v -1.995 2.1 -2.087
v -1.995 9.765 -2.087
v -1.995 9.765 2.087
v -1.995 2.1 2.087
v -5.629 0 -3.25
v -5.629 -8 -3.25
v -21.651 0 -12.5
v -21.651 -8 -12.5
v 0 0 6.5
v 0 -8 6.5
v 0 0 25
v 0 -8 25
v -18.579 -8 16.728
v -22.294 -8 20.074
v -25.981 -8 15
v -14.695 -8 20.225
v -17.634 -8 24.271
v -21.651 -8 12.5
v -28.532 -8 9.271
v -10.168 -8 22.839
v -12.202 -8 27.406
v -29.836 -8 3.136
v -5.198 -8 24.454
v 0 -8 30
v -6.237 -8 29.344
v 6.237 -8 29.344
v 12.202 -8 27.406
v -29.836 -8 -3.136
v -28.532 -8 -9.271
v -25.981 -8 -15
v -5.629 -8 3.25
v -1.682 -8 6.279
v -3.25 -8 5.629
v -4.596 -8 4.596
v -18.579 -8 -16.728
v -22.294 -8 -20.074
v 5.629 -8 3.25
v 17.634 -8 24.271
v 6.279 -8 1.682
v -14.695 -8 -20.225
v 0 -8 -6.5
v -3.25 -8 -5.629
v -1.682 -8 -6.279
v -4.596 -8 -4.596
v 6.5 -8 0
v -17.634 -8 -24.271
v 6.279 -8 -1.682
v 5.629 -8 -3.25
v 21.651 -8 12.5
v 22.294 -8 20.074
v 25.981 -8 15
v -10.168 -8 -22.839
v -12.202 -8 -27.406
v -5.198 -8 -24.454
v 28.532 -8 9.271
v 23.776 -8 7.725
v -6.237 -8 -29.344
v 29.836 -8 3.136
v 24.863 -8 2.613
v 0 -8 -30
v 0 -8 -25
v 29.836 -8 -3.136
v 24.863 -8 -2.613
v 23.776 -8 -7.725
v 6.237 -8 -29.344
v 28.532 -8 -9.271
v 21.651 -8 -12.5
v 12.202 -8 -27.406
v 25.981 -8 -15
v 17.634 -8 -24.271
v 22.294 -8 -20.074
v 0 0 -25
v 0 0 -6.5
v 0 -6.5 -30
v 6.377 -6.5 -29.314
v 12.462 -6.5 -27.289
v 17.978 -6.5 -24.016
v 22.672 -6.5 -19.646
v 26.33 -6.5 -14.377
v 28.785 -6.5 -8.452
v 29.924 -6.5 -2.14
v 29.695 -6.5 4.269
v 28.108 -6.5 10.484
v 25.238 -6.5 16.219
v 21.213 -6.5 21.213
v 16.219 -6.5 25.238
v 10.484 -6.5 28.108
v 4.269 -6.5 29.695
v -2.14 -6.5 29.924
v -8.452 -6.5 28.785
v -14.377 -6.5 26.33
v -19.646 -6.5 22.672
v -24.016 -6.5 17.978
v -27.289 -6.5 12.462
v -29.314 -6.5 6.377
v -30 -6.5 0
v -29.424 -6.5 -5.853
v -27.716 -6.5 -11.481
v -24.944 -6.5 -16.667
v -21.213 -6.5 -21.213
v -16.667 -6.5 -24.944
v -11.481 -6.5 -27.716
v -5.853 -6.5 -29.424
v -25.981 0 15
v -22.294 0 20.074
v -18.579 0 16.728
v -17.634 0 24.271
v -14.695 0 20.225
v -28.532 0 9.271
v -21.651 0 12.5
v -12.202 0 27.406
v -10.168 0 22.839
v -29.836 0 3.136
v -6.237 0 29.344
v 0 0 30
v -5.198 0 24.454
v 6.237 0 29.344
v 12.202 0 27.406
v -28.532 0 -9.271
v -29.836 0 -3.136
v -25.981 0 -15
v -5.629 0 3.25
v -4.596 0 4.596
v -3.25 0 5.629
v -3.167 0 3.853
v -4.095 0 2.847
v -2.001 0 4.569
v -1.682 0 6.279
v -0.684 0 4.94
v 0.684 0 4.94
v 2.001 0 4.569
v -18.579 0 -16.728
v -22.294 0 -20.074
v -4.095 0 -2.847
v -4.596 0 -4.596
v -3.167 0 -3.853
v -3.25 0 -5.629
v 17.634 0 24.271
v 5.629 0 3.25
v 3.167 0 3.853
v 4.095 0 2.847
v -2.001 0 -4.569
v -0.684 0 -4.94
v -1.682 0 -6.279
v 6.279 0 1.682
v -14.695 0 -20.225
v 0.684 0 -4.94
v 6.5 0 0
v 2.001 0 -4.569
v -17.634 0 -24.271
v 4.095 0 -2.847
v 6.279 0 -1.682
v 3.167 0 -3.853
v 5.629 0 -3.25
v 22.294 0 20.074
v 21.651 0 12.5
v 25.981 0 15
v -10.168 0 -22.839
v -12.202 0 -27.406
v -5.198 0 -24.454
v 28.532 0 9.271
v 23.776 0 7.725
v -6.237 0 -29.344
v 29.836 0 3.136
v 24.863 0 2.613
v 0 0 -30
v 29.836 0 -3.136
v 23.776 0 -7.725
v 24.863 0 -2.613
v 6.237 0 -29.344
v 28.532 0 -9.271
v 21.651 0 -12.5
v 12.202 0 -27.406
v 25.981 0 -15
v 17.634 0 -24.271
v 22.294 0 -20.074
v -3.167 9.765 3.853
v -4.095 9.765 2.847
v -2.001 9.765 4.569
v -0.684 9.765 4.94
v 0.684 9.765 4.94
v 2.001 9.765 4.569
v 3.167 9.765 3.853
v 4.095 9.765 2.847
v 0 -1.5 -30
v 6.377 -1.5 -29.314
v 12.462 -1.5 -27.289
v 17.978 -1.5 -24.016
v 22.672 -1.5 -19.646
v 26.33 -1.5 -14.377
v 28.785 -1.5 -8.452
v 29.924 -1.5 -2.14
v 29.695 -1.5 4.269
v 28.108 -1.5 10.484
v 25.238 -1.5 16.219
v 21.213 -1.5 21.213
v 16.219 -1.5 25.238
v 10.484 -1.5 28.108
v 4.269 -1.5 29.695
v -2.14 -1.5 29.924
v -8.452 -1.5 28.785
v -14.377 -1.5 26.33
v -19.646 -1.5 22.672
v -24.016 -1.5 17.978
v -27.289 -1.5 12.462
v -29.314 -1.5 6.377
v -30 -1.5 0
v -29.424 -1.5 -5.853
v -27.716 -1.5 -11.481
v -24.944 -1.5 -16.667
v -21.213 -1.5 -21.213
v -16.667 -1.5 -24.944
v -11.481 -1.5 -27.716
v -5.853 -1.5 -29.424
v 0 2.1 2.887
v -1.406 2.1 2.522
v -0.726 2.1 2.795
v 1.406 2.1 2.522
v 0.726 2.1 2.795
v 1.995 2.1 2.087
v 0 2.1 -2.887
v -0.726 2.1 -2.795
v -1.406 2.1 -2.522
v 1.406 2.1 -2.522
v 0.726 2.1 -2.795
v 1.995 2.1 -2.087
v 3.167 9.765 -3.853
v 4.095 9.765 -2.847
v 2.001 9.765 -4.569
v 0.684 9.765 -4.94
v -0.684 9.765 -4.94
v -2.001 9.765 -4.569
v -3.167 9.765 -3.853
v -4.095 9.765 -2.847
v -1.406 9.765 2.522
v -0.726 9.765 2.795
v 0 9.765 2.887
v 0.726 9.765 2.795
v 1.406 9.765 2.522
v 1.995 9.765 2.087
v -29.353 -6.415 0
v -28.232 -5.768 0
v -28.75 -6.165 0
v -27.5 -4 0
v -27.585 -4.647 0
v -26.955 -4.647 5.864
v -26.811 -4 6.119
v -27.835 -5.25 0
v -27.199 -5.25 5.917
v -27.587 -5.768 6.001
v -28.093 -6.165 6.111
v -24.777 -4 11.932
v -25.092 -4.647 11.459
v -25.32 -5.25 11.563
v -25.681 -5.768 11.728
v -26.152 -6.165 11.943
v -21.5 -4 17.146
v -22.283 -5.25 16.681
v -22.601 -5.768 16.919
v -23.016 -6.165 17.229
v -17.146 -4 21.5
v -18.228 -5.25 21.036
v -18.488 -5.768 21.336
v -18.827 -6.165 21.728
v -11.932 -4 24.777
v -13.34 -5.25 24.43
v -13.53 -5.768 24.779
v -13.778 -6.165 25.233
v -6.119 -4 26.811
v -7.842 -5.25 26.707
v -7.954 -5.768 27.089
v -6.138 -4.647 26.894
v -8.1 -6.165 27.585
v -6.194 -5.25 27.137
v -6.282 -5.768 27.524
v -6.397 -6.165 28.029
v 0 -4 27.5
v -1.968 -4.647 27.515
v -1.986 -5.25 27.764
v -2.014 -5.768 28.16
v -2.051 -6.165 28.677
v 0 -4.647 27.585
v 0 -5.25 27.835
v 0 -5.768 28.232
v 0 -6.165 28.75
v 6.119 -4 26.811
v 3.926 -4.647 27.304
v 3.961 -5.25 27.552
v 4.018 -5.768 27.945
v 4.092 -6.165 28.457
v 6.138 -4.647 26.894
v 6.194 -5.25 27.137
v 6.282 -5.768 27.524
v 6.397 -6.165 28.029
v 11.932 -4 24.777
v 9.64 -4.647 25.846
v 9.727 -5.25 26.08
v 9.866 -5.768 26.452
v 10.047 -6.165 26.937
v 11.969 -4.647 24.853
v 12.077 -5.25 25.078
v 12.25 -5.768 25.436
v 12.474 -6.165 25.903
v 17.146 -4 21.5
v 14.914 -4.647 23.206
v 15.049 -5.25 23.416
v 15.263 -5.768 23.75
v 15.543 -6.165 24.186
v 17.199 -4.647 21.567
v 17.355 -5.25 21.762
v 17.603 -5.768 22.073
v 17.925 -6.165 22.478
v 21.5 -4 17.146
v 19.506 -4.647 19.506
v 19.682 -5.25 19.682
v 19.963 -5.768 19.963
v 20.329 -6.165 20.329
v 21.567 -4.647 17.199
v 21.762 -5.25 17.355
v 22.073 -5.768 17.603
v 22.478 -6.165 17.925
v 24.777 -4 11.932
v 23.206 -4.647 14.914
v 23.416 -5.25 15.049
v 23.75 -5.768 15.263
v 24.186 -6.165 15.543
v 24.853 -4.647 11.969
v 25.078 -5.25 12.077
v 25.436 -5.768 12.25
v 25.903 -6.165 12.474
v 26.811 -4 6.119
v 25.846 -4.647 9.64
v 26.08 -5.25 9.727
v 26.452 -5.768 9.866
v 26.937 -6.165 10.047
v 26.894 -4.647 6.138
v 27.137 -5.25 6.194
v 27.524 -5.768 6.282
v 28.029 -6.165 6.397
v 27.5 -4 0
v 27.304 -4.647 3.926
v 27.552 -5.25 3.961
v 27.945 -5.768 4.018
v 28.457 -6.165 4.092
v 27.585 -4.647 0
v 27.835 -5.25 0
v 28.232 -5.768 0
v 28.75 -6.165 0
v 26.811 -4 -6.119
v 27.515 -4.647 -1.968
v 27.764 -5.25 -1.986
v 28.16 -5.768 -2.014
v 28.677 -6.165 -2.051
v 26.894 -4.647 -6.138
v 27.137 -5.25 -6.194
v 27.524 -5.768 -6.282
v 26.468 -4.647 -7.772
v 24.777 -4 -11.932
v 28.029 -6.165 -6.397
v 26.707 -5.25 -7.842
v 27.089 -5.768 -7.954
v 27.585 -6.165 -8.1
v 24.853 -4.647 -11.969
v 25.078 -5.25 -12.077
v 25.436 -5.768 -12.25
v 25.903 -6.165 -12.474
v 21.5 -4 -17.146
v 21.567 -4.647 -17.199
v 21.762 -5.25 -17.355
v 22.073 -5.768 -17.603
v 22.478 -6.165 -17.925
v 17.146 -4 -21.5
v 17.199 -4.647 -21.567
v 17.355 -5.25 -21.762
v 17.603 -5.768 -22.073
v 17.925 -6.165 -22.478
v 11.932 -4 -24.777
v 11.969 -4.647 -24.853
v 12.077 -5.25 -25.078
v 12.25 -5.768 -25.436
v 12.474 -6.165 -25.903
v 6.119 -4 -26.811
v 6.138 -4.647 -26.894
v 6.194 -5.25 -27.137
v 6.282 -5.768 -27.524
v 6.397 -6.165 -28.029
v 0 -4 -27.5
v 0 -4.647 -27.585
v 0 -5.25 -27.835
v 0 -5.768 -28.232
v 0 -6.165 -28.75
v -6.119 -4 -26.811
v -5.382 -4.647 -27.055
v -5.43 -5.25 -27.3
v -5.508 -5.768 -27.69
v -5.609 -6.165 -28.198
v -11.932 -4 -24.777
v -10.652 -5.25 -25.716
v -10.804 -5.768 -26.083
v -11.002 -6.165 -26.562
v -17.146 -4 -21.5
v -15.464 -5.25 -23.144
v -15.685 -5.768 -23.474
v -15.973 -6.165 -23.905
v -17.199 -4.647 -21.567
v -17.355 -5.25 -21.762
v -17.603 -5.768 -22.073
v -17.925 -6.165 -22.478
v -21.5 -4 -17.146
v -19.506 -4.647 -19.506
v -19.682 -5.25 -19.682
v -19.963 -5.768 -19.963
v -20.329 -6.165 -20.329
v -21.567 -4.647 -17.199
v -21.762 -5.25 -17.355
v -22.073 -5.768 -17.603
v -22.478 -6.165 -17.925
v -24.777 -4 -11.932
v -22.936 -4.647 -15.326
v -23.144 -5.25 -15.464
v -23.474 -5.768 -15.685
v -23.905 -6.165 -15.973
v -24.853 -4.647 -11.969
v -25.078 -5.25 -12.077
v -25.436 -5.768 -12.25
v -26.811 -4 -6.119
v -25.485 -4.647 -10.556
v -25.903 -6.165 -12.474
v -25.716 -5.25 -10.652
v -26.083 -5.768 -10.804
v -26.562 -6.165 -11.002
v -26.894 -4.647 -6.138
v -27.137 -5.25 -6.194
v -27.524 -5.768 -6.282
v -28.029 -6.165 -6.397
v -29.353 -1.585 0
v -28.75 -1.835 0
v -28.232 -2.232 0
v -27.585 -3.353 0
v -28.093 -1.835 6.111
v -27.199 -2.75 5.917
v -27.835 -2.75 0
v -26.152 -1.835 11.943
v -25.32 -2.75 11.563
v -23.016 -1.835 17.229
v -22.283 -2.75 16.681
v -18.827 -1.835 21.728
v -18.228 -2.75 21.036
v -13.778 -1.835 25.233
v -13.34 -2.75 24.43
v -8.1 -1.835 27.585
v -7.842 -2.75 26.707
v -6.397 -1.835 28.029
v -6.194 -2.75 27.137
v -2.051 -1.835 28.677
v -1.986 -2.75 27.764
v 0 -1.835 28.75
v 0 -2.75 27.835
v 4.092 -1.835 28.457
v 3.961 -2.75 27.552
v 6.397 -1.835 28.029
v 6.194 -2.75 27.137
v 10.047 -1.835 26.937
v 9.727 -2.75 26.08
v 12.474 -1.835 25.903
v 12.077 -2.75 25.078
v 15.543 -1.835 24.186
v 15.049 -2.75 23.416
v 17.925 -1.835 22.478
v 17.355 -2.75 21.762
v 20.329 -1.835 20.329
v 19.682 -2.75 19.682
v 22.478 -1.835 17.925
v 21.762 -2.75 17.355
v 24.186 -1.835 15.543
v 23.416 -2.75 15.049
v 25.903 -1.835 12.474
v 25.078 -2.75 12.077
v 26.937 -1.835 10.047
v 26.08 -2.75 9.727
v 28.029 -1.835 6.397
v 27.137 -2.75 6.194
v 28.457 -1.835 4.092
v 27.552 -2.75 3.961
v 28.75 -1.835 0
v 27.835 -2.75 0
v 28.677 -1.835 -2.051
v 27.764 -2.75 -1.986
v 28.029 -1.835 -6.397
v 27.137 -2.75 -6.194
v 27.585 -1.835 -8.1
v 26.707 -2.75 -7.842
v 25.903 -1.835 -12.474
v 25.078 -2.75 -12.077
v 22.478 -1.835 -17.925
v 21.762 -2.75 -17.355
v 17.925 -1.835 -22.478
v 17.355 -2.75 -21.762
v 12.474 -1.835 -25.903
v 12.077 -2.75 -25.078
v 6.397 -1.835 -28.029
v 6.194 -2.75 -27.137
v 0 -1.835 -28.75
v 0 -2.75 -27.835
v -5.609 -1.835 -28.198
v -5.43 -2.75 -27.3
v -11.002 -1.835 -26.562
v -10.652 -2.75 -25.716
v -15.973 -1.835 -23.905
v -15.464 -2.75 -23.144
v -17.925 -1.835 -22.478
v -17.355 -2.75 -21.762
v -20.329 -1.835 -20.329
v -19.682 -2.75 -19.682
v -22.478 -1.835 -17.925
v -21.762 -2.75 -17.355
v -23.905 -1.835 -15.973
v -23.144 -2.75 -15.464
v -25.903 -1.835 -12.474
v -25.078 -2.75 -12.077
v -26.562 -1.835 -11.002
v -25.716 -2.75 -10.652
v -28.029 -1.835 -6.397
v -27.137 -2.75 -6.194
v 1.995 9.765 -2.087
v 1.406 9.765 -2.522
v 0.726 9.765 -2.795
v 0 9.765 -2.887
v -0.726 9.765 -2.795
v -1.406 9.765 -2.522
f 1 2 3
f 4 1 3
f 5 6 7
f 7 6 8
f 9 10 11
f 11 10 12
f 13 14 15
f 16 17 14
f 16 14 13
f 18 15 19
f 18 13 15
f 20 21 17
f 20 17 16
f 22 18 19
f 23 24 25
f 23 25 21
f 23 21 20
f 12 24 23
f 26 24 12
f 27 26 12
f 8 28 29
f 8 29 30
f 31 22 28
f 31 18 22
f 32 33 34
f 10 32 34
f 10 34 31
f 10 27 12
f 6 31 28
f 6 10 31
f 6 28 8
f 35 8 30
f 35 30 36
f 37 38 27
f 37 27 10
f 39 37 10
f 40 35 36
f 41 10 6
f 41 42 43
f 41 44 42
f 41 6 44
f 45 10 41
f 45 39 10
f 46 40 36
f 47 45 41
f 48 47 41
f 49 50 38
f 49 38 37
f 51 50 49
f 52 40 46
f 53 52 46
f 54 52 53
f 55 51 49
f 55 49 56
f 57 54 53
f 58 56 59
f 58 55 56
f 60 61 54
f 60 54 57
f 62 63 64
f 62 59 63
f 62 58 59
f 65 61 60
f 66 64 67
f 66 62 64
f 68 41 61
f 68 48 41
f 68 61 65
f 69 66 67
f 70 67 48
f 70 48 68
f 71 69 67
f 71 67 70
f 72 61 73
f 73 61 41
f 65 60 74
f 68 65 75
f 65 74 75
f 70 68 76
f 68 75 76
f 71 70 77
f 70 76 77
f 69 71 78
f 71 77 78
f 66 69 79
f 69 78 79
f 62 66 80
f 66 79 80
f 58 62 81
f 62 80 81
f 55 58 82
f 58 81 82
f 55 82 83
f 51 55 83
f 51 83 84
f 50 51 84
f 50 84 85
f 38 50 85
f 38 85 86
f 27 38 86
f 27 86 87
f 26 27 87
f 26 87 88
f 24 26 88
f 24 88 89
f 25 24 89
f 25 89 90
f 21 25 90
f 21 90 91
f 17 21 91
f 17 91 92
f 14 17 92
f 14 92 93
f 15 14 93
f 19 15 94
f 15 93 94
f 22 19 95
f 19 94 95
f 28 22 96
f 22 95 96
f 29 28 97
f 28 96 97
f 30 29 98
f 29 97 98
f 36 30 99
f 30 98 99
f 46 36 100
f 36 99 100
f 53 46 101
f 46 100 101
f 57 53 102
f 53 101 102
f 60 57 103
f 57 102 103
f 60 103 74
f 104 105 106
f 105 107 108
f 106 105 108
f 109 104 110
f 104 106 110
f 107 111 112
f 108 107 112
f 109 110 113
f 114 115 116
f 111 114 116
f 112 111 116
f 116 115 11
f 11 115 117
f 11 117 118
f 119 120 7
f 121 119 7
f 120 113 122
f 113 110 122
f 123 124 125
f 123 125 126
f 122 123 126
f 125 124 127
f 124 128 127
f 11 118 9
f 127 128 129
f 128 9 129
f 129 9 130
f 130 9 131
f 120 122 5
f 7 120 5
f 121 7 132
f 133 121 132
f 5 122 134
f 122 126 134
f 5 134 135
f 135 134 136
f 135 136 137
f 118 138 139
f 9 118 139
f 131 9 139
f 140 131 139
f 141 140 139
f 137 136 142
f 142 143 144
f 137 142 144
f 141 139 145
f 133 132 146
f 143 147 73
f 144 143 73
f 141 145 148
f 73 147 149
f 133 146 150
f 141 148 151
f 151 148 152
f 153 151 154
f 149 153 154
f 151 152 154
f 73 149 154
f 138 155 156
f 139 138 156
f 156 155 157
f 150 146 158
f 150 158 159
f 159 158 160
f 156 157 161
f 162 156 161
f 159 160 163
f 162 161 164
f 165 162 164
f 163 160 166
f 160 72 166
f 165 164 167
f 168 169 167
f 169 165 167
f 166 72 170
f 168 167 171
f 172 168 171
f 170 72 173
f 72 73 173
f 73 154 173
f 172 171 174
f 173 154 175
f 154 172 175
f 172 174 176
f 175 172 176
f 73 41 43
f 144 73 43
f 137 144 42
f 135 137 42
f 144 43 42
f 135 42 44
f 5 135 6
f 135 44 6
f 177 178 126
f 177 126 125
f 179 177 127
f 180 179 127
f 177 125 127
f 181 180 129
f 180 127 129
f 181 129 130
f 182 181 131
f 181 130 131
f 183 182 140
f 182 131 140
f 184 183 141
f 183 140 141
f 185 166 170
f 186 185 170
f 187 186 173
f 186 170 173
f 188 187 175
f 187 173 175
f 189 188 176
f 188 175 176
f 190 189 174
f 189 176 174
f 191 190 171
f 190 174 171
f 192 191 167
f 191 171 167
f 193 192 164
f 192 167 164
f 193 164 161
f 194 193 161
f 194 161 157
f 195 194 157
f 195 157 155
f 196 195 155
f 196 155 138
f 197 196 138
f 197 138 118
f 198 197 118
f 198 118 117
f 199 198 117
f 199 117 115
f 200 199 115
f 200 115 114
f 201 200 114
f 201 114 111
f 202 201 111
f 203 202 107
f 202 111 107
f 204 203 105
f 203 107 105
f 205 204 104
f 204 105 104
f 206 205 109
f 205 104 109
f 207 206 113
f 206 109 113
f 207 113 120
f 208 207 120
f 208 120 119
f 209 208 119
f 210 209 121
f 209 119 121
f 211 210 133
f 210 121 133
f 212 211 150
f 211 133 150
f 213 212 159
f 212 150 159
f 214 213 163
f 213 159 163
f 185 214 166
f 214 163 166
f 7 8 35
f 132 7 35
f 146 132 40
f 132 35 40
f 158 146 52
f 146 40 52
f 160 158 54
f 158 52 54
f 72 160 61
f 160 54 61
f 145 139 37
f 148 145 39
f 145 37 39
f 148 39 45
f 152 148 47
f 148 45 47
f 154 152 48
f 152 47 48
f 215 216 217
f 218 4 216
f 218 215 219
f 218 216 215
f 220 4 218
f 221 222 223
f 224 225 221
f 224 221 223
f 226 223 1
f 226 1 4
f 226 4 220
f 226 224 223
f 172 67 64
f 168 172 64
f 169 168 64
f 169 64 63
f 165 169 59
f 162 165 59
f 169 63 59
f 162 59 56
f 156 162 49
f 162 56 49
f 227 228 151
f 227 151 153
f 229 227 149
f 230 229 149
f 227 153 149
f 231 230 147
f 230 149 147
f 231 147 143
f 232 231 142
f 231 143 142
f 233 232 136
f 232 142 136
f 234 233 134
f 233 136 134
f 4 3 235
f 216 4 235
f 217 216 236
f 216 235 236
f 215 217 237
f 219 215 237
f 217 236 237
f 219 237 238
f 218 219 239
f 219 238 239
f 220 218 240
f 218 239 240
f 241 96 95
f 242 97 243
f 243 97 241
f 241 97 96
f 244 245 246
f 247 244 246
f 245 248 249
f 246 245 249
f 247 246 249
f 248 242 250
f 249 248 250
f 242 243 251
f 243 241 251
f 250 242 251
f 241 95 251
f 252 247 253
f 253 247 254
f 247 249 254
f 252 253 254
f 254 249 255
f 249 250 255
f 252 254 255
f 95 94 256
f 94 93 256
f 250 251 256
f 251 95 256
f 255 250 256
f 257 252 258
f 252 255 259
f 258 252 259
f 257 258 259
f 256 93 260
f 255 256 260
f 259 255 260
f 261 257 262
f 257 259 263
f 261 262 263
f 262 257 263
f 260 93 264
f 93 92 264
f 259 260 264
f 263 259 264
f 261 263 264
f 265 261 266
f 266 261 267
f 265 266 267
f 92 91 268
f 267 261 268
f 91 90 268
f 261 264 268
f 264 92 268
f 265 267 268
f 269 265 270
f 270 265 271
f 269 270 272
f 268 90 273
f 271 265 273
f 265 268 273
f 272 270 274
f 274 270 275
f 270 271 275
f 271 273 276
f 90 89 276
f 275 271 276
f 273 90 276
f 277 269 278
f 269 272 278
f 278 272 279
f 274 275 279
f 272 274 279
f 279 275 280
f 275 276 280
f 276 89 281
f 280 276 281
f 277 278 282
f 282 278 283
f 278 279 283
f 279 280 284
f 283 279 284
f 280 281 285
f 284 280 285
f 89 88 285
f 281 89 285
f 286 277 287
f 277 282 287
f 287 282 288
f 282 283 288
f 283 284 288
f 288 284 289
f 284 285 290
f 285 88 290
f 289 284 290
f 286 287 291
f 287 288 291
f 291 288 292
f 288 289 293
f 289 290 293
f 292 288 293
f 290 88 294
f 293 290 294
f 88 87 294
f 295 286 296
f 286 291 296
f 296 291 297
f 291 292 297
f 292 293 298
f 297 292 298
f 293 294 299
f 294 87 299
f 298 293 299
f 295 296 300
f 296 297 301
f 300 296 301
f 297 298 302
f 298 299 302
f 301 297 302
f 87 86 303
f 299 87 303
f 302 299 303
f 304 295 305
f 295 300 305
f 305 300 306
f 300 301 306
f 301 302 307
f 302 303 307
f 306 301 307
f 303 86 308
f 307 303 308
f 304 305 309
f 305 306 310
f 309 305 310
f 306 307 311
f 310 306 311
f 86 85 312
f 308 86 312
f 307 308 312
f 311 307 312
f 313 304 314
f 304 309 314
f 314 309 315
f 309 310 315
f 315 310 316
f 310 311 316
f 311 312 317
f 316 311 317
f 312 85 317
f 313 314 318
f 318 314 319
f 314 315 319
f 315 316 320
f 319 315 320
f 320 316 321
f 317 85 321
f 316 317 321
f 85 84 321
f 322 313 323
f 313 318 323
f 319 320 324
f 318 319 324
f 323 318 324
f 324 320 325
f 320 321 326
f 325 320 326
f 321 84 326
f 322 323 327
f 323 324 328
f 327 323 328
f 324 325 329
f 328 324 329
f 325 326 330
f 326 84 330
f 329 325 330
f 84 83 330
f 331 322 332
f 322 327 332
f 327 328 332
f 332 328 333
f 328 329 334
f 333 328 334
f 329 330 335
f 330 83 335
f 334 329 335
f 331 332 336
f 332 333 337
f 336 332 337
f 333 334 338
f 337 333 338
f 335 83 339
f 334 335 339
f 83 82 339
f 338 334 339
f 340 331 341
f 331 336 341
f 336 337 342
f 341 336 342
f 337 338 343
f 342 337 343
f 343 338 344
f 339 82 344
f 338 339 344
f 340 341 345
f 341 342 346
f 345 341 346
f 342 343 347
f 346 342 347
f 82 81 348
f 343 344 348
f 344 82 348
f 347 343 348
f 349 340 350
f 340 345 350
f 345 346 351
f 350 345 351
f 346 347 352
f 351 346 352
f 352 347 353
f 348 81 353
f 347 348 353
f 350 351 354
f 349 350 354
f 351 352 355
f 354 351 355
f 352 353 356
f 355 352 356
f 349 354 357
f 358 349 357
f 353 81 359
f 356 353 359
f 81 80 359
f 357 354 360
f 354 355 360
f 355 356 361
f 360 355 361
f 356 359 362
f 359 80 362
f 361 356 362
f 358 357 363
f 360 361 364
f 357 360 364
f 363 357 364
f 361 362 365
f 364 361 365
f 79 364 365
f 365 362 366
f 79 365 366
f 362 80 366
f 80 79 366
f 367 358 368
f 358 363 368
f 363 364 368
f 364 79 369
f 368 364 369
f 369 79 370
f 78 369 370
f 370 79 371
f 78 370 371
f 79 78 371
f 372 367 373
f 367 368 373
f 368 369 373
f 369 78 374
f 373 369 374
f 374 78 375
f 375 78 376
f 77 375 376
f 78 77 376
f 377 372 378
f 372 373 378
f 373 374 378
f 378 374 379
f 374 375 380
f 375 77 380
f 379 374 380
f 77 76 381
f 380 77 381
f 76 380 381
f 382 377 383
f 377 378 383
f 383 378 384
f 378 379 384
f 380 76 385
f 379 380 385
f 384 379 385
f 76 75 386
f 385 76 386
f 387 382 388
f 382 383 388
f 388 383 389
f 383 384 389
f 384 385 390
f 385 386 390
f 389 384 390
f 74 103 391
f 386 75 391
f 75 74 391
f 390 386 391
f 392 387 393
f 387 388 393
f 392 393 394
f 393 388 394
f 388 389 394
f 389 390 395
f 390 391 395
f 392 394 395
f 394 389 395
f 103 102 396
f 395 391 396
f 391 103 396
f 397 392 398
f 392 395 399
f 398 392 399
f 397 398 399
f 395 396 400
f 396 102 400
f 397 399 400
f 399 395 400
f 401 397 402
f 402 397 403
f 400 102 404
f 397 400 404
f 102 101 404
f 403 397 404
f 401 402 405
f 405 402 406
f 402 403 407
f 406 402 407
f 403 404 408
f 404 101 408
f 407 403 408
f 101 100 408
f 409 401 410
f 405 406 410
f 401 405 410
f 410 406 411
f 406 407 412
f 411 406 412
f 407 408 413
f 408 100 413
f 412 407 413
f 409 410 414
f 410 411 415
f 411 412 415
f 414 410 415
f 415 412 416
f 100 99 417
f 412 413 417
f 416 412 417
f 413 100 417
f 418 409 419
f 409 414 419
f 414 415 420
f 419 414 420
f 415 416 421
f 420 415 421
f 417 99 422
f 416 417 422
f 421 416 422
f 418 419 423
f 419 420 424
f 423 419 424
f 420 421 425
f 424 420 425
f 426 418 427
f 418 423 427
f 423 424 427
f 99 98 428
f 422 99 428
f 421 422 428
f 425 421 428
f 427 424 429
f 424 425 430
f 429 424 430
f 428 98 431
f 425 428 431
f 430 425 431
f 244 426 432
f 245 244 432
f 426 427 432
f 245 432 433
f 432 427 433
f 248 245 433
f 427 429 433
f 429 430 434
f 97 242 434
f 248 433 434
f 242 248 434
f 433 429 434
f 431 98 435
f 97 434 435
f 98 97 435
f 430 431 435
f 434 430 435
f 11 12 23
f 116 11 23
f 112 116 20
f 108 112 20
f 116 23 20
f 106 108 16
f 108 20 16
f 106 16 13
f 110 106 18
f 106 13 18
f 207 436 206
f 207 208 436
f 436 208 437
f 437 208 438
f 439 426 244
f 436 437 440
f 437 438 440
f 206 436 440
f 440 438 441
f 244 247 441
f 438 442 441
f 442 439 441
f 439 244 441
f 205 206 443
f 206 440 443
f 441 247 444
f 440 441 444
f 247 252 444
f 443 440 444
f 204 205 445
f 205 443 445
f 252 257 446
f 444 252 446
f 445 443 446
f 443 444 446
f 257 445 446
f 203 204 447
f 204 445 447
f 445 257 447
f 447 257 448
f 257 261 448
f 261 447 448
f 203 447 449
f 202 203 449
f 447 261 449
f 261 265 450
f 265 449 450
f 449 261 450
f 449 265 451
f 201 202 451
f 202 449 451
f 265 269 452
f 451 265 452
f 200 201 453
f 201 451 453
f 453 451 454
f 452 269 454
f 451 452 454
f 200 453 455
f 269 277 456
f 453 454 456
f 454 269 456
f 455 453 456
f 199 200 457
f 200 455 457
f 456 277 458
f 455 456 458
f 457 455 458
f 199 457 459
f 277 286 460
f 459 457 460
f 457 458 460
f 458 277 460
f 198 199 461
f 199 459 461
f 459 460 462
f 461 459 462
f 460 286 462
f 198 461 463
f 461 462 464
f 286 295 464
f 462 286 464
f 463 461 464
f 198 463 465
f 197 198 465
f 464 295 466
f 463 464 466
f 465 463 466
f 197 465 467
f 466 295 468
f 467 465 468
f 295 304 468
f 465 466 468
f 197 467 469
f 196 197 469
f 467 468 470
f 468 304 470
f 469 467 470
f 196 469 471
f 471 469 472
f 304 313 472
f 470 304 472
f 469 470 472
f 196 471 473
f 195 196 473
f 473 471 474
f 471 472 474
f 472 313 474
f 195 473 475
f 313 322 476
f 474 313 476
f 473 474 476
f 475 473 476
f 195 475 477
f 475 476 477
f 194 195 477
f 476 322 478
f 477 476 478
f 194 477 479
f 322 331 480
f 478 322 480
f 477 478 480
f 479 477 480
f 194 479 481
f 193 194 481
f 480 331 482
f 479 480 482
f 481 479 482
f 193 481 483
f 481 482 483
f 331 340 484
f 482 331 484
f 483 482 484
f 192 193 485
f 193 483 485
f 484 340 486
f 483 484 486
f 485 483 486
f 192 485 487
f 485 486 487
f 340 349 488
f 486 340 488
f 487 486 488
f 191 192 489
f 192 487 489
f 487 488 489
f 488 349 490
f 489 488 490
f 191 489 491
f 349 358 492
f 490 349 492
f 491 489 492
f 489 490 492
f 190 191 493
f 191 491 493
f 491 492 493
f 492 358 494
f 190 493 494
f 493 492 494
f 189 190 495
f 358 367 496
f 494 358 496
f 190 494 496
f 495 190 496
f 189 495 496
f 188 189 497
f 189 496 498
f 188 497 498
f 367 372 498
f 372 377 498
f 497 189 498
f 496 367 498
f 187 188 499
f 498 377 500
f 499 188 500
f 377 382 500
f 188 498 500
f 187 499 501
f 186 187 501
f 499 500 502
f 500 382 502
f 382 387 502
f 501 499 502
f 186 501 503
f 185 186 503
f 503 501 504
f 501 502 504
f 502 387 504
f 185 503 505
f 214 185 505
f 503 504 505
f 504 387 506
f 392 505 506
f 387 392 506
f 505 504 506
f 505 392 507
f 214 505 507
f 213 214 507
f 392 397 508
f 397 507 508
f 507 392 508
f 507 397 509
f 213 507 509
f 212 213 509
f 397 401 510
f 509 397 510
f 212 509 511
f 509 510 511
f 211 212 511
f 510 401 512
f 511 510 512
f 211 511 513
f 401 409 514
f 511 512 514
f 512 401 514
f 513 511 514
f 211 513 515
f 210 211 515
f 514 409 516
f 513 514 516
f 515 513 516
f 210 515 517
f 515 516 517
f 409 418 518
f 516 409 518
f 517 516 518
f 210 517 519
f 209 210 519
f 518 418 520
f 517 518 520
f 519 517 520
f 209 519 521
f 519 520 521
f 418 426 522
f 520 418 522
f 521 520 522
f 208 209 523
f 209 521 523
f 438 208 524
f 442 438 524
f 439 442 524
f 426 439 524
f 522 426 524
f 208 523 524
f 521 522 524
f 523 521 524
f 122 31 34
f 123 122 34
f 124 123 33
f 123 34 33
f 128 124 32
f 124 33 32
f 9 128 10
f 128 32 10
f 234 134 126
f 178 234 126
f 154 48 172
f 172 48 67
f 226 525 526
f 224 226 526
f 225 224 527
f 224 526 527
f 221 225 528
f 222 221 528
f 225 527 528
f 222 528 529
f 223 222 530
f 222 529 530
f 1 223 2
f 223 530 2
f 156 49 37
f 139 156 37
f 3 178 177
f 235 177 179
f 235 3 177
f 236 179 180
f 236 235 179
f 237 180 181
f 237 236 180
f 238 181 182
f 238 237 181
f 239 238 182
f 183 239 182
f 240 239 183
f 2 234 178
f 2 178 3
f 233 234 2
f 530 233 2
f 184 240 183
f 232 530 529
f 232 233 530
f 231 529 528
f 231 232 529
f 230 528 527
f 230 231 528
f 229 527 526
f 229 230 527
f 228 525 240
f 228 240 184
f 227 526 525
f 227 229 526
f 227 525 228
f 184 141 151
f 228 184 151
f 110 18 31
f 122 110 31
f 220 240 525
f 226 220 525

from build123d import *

# Parameters (mm, degrees)
EXTRUS_O1_DEPTH = 9.3
EXTRUS_O2_DEPTH = 7.3
ESCALA3_SCALE   = 1.05
ESBO_O3_R       = 30
EXTRUS_O3_DEPTH = 8
ESBO_O4_R       = 2.5
EXTRUS_O6_DEPTH = 8


with BuildPart() as part:
    # Esboço1 → Extrusão1 (new body)
    with BuildSketch(Plane(origin=(0, 0, 0), x_dir=(1, 0, 0), z_dir=(0, 1, 0))):
        with BuildLine():
            Line((3.9, 0), (0, 0))
            Line((0, 0), (-3.9, 0))
            Line((-3.9, 0), (-3.9, -2.711549373))
            ThreePointArc((-3.9, -2.711549373), (0, -4.75), (3.9, -2.711549373))
            Line((3.9, -2.711549373), (3.9, 0))
        make_face()
        with BuildLine():
            Line((-3.9, 0), (0, 0))
            Line((0, 0), (3.9, 0))
            Line((3.9, 0), (3.9, 2.711549373))
            ThreePointArc((3.9, 2.711549373), (0, 4.75), (-3.9, 2.711549373))
            Line((-3.9, 2.711549373), (-3.9, 0))
        make_face()
        with BuildLine():
            Line((-3.9, 0), (0, 0))
            Line((0, 0), (3.9, 0))
            Line((3.9, 0), (3.9, 2.711549373))
            ThreePointArc((3.9, 2.711549373), (0, 4.75), (-3.9, 2.711549373))
            Line((-3.9, 2.711549373), (-3.9, 0))
        make_face()
    extrude(amount=EXTRUS_O1_DEPTH)

    # Esboço2 → Extrusão2 (cut)
    with BuildSketch(Plane(origin=(0, 9.3, 0), x_dir=(1, 0, 0), z_dir=(0, 1, 0))):
        with BuildLine():
            Line((-1.9, 0), (0, 0))
            Line((0, 0), (1.9, 0))
            Line((1.9, 0), (1.9, 1.988089535))
            ThreePointArc((1.9, 1.988089535), (0, 2.75), (-1.9, 1.988089535))
            Line((-1.9, 1.988089535), (-1.9, 0))
        make_face()
        with BuildLine():
            Line((1.9, 0), (0, 0))
            Line((0, 0), (-1.9, 0))
            Line((-1.9, 0), (-1.9, -1.988089535))
            ThreePointArc((-1.9, -1.988089535), (0, -2.75), (1.9, -1.988089535))
            Line((1.9, -1.988089535), (1.9, 0))
        make_face()
    extrude(amount=-EXTRUS_O2_DEPTH, mode=Mode.SUBTRACT)


with BuildPart() as part_1:
    # Escala3: scaled about (0, 0, 0)
    add(part.part.scale(ESCALA3_SCALE))

    # Esboço3 → Extrusão3 (add)
    with BuildSketch(Plane.XZ):
        with Locations(Location((0, 0, 0), (0, 0, 270))):
            Circle(ESBO_O3_R)
    extrude(amount=EXTRUS_O3_DEPTH)

    # Varredura de corte1: sweep along a path in Esboço6
    with BuildLine(Plane(origin=(0, -4, 0), x_dir=(-1, 0, 0), z_dir=(0, 1, 0))) as varredura_de_corte1_path:
        CenterArc((0, 0), 30, 0, 360)
    # Esboço4 → Varredura de corte1 (sweep, cut)
    with BuildSketch(Plane(origin=(0, 0, 0), x_dir=(0, 0, -1), z_dir=(1, 0, 0))):
        with Locations((-30, -4)):
            Circle(ESBO_O4_R)
    sweep(path=varredura_de_corte1_path.line, mode=Mode.SUBTRACT)

    # Esboço7 → Extrusão6 (cut)
    with BuildSketch(Plane.XZ.offset(8)):
        with BuildLine():
            Line((-21.650635095, 12.5), (-5.629165125, 3.25))
            ThreePointArc((-5.629165125, 3.25), (-3.25, 5.629165125), (0, 6.5))
            Line((0, 6.5), (0, 25))
            ThreePointArc((0, 25), (-12.5, 21.650635095), (-21.650635095, 12.5))
        make_face()
        with BuildLine():
            Line((0, -25), (0, -6.5))
            ThreePointArc((0, -6.5), (-3.25, -5.629165125), (-5.629165125, -3.25))
            Line((-5.629165125, -3.25), (-21.650635095, -12.5))
            ThreePointArc((-21.650635095, -12.5), (-12.5, -21.650635095), (0, -25))
        make_face()
        with BuildLine():
            Line((21.650635095, 12.5), (5.629165125, 3.25))
            ThreePointArc((5.629165125, 3.25), (6.5, 0), (5.629165125, -3.25))
            Line((5.629165125, -3.25), (21.650635095, -12.5))
            ThreePointArc((21.650635095, -12.5), (25, 0), (21.650635095, 12.5))
        make_face()
    extrude(amount=-EXTRUS_O6_DEPTH, mode=Mode.SUBTRACT)


solid = part_1.part
